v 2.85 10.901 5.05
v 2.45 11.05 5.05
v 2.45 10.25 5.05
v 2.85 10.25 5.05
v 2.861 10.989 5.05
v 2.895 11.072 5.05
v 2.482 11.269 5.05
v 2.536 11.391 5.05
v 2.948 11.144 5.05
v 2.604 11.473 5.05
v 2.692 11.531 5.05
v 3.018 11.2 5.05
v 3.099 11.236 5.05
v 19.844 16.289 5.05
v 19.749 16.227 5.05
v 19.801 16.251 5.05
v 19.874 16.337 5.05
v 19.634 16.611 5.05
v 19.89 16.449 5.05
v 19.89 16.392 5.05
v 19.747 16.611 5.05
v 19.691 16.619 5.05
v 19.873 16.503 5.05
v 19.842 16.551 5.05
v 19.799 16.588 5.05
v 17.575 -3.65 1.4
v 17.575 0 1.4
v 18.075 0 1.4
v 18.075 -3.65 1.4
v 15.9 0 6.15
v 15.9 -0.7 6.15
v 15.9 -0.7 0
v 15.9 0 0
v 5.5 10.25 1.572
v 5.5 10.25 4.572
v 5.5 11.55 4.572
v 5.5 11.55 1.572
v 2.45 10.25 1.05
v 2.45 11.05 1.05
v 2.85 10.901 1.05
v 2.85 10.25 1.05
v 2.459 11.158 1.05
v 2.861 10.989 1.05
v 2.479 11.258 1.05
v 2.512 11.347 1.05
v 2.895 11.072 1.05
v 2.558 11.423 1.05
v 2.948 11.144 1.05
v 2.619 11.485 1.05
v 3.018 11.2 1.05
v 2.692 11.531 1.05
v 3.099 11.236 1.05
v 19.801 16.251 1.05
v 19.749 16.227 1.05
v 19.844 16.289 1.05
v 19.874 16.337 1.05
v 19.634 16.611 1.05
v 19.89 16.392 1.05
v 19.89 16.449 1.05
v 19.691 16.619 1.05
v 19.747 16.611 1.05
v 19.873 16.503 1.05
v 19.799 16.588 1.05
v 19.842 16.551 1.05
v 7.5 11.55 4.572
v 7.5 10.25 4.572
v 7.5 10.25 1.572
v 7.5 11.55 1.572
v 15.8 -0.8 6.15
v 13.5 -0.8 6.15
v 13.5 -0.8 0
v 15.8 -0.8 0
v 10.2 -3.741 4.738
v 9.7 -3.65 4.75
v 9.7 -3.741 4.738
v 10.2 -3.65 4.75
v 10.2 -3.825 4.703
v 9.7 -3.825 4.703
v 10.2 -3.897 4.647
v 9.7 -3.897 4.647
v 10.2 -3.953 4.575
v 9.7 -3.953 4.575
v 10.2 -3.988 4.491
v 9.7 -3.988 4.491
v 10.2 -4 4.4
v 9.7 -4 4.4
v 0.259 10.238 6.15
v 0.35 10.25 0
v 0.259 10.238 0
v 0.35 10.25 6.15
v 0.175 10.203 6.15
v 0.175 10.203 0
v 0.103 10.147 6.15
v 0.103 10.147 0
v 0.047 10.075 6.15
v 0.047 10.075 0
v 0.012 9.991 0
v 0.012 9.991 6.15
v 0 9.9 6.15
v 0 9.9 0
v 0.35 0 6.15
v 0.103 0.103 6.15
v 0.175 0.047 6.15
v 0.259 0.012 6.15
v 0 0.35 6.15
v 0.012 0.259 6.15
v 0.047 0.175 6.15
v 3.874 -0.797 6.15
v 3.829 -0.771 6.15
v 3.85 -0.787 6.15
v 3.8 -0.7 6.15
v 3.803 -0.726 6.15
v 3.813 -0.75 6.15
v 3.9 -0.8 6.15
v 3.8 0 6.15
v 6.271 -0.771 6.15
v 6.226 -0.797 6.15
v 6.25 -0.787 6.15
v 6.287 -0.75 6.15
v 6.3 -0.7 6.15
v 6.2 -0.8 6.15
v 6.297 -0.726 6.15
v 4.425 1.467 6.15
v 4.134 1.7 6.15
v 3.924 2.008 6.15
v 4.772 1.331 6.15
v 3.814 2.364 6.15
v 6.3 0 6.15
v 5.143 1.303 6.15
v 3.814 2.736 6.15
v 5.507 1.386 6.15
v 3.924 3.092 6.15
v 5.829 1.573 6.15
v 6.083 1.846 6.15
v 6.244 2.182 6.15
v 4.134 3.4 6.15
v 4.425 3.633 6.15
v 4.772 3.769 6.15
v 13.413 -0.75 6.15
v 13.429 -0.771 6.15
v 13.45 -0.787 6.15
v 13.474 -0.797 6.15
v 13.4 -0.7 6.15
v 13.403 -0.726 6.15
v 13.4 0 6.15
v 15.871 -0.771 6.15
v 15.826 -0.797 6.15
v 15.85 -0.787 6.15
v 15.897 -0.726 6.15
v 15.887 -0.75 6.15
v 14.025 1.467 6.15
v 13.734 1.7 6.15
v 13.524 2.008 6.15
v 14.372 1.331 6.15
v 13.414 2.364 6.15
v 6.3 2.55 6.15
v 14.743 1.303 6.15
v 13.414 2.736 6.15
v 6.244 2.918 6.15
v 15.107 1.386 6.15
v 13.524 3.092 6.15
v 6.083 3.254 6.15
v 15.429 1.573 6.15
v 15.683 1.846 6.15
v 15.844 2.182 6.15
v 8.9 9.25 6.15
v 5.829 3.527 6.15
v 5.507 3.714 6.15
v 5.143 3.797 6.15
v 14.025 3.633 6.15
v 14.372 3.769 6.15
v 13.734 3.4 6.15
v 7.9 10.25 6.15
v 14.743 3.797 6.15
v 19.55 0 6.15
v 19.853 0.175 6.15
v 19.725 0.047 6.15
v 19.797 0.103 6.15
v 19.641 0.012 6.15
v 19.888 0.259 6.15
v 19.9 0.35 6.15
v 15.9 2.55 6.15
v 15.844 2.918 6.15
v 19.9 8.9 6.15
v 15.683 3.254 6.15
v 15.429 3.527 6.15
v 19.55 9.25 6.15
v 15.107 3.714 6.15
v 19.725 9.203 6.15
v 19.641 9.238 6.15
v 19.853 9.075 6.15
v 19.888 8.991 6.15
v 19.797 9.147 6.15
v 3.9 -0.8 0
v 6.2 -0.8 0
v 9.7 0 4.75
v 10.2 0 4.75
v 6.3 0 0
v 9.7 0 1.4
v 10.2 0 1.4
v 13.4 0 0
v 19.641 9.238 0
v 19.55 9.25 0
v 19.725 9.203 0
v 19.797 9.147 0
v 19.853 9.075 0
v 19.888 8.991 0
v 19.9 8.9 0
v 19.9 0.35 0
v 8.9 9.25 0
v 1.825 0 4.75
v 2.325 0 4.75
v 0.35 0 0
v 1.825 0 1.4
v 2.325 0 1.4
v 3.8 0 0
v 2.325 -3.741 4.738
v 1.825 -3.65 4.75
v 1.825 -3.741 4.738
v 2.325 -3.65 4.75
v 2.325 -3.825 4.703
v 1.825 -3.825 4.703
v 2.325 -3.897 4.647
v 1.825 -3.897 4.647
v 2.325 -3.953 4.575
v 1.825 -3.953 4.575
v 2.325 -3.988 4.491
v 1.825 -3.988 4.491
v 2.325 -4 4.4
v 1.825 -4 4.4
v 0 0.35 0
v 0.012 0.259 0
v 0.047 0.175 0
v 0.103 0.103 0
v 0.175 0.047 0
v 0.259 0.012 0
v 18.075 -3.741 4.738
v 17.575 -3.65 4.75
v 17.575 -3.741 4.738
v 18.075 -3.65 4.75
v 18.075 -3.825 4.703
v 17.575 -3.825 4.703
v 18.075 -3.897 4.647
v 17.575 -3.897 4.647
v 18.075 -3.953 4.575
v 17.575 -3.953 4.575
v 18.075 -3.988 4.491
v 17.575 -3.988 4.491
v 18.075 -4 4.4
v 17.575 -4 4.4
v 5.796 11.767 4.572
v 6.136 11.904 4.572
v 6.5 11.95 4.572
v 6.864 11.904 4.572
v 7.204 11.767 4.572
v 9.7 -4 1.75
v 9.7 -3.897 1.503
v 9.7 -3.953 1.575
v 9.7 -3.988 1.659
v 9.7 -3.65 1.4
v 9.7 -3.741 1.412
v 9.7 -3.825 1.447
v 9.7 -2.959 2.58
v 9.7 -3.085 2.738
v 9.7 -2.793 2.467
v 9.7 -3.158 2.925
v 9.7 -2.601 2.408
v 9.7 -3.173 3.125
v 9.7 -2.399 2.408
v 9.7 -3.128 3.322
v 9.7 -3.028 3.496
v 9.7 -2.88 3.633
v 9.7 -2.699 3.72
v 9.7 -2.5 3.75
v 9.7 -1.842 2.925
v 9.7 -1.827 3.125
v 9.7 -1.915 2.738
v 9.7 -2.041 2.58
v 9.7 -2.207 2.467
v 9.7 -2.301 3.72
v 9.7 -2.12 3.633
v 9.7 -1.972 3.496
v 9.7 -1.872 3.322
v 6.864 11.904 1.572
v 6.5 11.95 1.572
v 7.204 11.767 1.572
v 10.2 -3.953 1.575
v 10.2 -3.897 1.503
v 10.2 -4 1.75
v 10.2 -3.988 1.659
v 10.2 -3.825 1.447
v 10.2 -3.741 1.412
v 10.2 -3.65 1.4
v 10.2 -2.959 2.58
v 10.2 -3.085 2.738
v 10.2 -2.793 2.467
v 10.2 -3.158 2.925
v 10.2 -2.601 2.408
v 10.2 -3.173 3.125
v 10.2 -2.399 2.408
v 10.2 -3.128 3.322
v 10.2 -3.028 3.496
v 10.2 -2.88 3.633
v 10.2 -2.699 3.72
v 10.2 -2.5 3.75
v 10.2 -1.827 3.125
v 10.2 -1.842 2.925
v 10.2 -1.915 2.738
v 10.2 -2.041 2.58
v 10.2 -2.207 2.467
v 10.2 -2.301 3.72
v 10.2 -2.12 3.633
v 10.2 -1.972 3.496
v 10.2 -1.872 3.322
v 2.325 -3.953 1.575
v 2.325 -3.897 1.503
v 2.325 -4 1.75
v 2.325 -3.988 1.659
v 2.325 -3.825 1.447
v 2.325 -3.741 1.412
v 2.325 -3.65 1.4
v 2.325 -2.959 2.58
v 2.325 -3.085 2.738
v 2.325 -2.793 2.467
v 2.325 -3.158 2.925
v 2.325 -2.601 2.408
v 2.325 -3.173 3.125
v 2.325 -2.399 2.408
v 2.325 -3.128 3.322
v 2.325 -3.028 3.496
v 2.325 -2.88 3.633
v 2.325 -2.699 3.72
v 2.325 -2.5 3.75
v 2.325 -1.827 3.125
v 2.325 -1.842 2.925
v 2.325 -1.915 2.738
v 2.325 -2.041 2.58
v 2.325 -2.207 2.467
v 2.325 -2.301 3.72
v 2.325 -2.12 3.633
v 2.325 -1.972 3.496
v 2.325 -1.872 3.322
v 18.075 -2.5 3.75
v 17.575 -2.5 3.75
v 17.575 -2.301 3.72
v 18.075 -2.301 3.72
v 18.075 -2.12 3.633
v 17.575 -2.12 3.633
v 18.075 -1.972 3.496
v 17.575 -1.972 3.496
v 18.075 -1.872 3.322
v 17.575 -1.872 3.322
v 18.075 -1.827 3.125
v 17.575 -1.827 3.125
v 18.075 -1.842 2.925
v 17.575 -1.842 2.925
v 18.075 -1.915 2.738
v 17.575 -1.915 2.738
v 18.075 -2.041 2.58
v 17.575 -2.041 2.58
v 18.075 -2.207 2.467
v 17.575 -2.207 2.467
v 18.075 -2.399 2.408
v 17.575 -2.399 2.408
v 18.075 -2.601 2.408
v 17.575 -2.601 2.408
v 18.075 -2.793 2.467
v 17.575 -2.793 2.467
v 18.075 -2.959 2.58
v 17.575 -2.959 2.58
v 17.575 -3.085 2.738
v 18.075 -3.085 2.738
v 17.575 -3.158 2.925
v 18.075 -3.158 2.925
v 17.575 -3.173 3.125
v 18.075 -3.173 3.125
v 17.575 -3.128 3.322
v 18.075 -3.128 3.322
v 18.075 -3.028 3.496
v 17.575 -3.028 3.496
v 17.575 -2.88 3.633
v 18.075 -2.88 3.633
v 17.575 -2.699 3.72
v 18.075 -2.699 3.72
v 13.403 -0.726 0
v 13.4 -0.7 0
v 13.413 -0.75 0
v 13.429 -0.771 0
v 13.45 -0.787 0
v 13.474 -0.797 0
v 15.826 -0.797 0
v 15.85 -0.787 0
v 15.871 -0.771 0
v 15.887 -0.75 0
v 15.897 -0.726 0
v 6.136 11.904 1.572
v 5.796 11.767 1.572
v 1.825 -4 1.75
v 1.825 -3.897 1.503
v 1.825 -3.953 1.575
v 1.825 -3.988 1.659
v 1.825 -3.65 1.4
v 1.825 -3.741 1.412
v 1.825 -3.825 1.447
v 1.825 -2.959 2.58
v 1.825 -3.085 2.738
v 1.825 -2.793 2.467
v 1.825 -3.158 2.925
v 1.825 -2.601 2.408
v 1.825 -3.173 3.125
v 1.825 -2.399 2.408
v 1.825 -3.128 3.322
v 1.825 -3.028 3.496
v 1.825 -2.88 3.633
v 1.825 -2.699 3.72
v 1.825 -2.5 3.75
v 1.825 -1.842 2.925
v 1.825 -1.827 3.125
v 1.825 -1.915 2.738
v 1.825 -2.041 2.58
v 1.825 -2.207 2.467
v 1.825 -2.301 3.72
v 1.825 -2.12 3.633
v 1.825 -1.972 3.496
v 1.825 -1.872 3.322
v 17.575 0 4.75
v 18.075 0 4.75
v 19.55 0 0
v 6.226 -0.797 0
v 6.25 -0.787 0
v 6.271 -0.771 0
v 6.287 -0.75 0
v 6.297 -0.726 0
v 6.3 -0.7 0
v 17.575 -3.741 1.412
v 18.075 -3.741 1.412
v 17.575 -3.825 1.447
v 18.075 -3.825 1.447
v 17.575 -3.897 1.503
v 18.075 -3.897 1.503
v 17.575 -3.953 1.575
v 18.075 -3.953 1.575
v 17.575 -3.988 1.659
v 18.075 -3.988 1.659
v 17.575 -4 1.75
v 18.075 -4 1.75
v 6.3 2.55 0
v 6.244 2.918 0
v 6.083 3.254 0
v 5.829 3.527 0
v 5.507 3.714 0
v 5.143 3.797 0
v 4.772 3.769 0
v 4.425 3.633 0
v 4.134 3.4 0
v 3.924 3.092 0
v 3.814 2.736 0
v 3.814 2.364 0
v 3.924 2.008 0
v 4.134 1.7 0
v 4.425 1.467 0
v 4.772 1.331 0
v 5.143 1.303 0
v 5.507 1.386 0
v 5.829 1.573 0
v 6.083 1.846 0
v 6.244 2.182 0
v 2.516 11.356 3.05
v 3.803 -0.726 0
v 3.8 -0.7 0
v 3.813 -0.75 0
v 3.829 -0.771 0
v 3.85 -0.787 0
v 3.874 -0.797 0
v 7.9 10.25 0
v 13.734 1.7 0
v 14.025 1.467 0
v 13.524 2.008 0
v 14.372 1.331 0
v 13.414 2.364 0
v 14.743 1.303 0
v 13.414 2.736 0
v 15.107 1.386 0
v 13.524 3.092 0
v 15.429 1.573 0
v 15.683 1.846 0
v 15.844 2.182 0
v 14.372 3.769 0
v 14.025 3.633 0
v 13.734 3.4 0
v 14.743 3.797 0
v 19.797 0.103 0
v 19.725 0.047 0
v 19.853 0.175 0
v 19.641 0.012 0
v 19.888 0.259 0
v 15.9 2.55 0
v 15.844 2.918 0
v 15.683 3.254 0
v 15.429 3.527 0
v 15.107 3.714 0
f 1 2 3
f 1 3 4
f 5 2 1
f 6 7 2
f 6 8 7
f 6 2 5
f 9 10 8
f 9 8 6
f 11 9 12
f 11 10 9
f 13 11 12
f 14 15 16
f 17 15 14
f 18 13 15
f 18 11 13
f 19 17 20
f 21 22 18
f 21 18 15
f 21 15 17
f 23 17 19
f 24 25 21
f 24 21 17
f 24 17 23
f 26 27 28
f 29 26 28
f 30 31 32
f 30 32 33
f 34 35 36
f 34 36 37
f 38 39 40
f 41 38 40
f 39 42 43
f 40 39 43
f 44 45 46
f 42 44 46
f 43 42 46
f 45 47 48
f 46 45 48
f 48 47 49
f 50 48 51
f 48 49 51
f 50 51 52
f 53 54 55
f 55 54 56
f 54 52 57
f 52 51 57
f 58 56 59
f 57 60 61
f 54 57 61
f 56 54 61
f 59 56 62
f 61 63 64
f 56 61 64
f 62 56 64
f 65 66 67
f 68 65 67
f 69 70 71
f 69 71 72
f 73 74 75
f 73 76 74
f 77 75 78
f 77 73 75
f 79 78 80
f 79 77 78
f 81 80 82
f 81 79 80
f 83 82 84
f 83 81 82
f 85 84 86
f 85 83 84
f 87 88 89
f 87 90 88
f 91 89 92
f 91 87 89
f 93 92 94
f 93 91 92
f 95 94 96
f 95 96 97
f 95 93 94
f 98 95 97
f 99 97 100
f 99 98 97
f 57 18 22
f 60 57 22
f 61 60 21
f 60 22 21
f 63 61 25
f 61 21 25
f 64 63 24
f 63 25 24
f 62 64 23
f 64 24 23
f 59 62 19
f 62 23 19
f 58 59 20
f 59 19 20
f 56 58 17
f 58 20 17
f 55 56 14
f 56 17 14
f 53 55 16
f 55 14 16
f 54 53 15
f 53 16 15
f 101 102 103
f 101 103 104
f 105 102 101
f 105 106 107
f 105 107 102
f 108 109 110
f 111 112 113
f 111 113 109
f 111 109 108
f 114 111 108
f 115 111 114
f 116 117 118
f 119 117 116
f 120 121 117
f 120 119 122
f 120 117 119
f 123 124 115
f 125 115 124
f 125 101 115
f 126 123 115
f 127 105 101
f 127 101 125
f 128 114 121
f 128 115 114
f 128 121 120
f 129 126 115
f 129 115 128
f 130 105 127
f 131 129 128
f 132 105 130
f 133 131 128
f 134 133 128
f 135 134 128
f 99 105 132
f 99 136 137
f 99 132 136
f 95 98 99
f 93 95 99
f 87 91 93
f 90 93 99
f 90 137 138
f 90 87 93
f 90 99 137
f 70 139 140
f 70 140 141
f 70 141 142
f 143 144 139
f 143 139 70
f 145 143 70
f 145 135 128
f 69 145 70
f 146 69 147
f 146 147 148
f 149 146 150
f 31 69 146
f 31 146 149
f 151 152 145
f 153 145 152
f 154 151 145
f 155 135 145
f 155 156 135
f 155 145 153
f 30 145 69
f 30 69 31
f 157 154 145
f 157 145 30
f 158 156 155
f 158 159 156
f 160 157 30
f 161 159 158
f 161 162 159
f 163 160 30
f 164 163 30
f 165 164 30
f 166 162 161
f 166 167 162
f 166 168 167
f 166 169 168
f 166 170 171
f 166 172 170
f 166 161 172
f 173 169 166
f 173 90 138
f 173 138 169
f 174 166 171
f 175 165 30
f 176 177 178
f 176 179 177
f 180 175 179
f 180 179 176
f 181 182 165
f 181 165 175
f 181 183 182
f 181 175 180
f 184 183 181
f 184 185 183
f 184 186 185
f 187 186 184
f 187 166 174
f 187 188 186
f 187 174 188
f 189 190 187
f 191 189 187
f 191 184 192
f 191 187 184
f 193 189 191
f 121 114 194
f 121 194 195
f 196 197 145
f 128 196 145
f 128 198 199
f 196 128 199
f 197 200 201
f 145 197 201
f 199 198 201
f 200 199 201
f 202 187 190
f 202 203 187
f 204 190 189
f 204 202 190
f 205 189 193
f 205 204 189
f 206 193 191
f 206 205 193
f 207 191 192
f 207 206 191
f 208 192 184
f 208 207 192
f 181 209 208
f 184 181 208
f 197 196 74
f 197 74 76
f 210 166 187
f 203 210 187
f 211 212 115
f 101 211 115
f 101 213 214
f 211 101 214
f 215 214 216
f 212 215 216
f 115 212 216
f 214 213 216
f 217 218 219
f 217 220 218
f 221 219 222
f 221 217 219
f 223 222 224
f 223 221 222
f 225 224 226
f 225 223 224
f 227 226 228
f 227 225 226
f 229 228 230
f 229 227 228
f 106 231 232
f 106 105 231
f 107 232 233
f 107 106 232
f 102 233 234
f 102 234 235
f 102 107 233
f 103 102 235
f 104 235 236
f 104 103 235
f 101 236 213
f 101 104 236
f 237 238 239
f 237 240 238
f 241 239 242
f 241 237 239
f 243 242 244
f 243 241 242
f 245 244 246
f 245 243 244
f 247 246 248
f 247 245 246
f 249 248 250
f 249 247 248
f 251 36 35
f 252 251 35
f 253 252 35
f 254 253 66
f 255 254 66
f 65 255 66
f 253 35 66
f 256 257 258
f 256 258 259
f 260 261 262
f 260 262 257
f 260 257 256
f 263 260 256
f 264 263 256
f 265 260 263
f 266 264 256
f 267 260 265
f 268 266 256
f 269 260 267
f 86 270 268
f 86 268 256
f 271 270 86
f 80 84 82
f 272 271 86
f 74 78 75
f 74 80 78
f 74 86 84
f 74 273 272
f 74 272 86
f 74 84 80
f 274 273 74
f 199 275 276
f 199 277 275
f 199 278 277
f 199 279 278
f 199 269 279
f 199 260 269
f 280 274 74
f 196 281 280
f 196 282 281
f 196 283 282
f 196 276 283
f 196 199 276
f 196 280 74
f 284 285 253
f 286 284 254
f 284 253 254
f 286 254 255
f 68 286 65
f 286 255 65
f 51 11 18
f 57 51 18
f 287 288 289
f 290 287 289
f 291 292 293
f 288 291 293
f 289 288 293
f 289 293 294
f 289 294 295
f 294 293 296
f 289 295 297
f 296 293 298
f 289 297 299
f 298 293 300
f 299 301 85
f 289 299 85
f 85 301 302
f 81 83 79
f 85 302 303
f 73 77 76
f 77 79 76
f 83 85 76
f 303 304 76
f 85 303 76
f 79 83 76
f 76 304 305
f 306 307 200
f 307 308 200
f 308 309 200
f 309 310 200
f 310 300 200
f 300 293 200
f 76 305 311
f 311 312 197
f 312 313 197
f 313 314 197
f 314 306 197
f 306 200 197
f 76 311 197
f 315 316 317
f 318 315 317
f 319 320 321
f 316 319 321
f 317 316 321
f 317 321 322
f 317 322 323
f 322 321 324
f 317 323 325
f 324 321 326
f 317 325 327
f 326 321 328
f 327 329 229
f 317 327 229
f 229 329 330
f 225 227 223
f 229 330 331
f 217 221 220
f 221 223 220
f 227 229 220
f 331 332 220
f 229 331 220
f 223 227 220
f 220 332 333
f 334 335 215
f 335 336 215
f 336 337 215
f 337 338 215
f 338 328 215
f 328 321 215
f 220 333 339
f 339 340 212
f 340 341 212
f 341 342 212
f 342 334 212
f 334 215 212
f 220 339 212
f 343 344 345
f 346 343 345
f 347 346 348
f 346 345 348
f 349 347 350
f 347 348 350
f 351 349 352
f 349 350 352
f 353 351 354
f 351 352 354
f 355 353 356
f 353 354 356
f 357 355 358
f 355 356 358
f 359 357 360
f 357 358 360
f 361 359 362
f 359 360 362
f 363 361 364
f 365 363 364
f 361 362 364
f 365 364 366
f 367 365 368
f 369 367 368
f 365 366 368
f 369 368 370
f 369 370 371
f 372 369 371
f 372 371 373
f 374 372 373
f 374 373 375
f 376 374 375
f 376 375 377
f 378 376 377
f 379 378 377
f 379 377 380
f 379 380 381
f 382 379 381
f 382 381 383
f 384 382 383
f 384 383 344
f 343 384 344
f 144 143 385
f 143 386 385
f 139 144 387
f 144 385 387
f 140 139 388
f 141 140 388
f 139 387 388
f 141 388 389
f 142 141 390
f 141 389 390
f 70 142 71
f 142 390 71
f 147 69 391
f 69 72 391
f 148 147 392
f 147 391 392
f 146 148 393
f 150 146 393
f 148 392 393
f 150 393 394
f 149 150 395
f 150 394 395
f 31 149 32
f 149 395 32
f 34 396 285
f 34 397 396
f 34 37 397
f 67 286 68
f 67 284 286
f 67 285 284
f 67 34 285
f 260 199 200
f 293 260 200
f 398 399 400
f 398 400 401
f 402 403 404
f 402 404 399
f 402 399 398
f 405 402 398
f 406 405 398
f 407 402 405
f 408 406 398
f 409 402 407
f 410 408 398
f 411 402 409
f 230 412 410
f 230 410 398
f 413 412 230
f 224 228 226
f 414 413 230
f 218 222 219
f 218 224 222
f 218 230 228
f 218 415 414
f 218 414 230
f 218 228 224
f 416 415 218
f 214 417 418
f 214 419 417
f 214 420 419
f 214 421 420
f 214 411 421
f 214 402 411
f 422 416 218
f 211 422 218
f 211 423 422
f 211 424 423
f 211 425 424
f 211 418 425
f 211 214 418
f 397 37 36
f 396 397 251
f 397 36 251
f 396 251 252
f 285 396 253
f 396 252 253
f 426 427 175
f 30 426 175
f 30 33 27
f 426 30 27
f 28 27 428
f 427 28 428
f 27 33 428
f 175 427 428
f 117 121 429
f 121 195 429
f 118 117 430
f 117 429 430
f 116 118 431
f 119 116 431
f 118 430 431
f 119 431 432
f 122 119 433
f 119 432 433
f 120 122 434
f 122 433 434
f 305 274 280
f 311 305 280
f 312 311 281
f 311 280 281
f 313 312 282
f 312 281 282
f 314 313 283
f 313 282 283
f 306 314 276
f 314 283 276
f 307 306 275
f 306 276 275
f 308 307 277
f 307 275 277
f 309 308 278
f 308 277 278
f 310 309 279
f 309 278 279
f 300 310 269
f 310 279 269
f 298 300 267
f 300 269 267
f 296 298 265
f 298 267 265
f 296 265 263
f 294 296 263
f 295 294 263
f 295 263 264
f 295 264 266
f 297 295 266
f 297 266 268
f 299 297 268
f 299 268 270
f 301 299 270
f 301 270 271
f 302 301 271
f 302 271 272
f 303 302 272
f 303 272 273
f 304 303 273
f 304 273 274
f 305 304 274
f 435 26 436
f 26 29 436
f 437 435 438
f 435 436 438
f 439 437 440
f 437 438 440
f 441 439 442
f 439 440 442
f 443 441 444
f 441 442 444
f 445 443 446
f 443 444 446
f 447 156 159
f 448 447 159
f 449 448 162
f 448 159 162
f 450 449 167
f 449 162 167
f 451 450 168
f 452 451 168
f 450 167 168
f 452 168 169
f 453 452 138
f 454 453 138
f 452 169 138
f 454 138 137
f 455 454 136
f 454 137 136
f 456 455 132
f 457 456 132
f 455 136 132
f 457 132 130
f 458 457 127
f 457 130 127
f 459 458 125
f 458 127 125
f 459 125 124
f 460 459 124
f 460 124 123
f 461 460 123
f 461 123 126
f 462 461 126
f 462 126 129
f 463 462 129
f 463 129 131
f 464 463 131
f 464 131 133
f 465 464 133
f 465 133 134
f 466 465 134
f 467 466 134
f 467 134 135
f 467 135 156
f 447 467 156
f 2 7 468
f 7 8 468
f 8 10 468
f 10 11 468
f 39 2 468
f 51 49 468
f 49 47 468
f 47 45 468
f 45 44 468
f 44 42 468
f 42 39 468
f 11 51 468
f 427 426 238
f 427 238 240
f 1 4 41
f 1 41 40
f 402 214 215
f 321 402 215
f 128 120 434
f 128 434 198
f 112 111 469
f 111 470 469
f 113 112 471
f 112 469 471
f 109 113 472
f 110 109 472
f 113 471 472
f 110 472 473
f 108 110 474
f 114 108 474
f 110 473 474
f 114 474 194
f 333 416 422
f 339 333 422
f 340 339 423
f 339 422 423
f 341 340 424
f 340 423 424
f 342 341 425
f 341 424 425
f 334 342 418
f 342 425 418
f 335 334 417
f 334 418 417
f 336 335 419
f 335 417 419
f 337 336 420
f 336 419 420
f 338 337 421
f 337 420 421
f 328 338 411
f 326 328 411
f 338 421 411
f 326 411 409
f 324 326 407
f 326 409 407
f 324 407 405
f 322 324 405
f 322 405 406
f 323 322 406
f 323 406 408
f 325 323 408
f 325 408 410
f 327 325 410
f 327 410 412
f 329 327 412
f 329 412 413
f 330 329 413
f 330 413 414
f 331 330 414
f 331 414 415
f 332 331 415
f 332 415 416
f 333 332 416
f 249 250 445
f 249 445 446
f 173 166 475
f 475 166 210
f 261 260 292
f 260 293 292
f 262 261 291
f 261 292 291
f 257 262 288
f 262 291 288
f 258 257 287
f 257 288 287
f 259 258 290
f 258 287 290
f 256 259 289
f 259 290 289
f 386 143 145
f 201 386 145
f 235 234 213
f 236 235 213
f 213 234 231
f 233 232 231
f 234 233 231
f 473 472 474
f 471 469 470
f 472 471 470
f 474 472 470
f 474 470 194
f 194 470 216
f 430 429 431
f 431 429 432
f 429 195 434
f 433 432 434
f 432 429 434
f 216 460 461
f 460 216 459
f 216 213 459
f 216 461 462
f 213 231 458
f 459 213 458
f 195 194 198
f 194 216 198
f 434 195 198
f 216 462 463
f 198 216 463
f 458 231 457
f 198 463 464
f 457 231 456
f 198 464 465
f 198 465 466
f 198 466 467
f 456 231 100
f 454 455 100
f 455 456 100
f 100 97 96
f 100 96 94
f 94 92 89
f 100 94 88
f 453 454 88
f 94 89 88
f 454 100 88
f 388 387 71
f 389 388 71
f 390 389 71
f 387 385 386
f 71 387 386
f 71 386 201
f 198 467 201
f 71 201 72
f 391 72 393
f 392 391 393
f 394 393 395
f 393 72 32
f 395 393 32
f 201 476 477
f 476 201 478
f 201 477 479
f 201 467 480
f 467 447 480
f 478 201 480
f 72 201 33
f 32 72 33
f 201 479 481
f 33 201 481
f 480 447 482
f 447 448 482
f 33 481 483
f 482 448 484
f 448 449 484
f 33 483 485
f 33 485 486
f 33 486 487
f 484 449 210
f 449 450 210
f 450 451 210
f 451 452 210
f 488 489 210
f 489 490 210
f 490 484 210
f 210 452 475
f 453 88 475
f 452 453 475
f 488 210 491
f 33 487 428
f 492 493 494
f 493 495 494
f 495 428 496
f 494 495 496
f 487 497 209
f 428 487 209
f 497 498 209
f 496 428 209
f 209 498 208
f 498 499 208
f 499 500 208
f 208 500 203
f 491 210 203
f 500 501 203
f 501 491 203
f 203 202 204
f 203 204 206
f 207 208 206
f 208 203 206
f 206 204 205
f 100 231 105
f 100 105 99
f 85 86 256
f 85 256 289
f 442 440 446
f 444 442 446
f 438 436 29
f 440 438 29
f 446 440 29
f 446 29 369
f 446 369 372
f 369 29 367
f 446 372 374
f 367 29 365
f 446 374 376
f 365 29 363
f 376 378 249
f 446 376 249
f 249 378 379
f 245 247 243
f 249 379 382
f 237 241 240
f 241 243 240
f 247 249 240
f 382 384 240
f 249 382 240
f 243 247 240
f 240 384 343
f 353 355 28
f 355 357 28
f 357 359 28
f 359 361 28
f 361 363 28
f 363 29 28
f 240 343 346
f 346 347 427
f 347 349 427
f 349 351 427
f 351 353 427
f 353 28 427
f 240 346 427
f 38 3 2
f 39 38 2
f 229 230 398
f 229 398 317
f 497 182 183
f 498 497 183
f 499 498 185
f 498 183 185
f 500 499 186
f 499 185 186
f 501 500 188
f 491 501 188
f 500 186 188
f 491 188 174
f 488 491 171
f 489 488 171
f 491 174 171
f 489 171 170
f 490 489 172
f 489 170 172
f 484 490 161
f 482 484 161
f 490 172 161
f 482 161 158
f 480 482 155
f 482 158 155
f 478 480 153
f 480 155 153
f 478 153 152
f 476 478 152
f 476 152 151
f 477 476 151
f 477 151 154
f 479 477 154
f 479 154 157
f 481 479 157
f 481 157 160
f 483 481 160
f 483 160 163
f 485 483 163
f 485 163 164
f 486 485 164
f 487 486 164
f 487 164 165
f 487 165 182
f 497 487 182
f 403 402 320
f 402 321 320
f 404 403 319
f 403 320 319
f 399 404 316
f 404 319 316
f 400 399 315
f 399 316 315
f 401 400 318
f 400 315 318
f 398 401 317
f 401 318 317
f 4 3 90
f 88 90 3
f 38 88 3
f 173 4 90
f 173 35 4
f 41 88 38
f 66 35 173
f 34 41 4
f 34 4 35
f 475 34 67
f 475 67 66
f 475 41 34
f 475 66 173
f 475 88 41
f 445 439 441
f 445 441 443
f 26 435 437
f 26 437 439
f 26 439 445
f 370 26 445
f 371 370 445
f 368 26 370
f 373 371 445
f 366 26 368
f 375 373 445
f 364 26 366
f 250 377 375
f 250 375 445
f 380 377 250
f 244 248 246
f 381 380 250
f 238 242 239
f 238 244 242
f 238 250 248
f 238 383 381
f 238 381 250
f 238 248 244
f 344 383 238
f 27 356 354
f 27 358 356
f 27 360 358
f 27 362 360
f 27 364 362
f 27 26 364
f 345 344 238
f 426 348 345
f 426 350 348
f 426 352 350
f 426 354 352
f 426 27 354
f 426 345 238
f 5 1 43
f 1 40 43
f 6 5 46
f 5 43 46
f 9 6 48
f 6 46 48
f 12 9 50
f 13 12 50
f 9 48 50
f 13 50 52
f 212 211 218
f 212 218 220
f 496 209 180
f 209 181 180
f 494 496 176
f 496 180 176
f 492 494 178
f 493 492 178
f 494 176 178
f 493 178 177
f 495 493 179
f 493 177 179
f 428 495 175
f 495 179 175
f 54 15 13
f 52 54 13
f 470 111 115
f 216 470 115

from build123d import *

# Parameters (mm, degrees)
SKETCH1_W           = 19.9
SKETCH1_H           = 10.25
BOSS_EXTRUDE1_DEPTH = 6.15
SKETCH2_W           = 12
SKETCH2_H           = 1
CUT_EXTRUDE1_DEPTH  = 6.15
FILLET1_SIZE        = 1
FILLET2_R           = 0.35
SKETCH3_W           = 2
SKETCH3_H           = 3
BOSS_EXTRUDE2_DEPTH = 1.7
CUT_EXTRUDE2_DEPTH  = 21.5
SKETCH5_R           = 1.25
CUT_EXTRUDE3_DEPTH  = 21.5
SKETCH6_W           = 2.5
SKETCH6_H           = 0.8
BOSS_EXTRUDE3_DEPTH = 6.15
FILLET3_R           = 0.1
SKETCH7_W           = 0.5
SKETCH7_H           = 3.35
BOSS_EXTRUDE4_DEPTH = 4
SKETCH8_R           = 0.675
CUT_EXTRUDE4_DEPTH  = 44
FILLET4_R           = 0.35
BOSS_EXTRUDE5_START = -1.1
SKETCH9_W           = 0.4
SKETCH9_H           = 1
BOSS_EXTRUDE5_DEPTH = 4
CUT_EXTRUDE7_DEPTH  = 24
FILLET6_R           = 0.35


with BuildPart() as part:
    # Sketch1 → Boss-Extrude1 (new body)
    with BuildSketch(Plane.XY):
        with Locations((9.95, 5.125)):
            Rectangle(SKETCH1_W, SKETCH1_H)
    extrude(amount=BOSS_EXTRUDE1_DEPTH)

    # Sketch2 → Cut-Extrude1 (cut)
    with BuildSketch(Plane.XY.offset(6.15)):
        with Locations((13.9, 9.75)):
            Rectangle(SKETCH2_W, SKETCH2_H)
    extrude(amount=-CUT_EXTRUDE1_DEPTH, mode=Mode.SUBTRACT)

    # Fillet1
    fillet1_edges = [part.edges().sort_by_distance(p)[0] for p in [
        (7.9, 9.25, 3.075),
    ]]
    chamfer(fillet1_edges, length=FILLET1_SIZE - 0.0001)  # a hair under: the kernel refuses the full size

    # Fillet2
    fillet2_edges = [part.edges().sort_by_distance(p)[0] for p in [
        (19.9, 9.25, 3.075),
        (0, 10.25, 3.075),
        (19.9, 0, 3.075),
        (0, 0, 3.075),
    ]]
    fillet(fillet2_edges, radius=FILLET2_R)

    # Sketch3 → Boss-Extrude2 (add)
    with BuildSketch(Plane(origin=(0, 10.25, 0), x_dir=(1, 0, 0), z_dir=(0, 1, 0))):
        with Locations((6.5, -3.072396368)):
            Rectangle(SKETCH3_W, SKETCH3_H)
    extrude(amount=BOSS_EXTRUDE2_DEPTH)

    # Sketch4 → Cut-Extrude2 (cut)
    with BuildSketch(Plane.XY.offset(4.572396368)):
        with BuildLine():
            Line((5.5, 11.95), (5.5, 11.55))
            ThreePointArc((5.5, 11.55), (5.961483519, 11.846291202), (6.5, 11.95))
            Line((6.5, 11.95), (5.5, 11.95))
        make_face()
        with BuildLine():
            Line((7.5, 11.95), (6.5, 11.95))
            ThreePointArc((6.5, 11.95), (7.038516481, 11.846291202), (7.5, 11.55))
            Line((7.5, 11.55), (7.5, 11.95))
        make_face()
    extrude(amount=-CUT_EXTRUDE2_DEPTH, mode=Mode.SUBTRACT)

    # Sketch5 → Cut-Extrude3 (cut)
    with BuildSketch(Plane.XY.offset(6.15)):
        with Locations((5.05, 2.55)):
            Circle(SKETCH5_R)
        with Locations((14.65, 2.55)):
            Circle(SKETCH5_R)
    extrude(amount=-CUT_EXTRUDE3_DEPTH, mode=Mode.SUBTRACT)

    # Sketch6 → Boss-Extrude3 (add)
    with BuildSketch(Plane.XY.offset(6.15)):
        with Locations((5.05, -0.4)):
            Rectangle(SKETCH6_W, SKETCH6_H)
        with Locations((14.65, -0.4)):
            Rectangle(SKETCH6_W, SKETCH6_H)
    extrude(amount=-BOSS_EXTRUDE3_DEPTH)

    # Fillet3
    fillet3_edges = [part.edges().sort_by_distance(p)[0] for p in [
        (15.9, -0.8, 3.075),
        (13.4, -0.8, 3.075),
        (6.3, -0.8, 3.075),
        (3.8, -0.8, 3.075),
    ]]
    fillet(fillet3_edges, radius=FILLET3_R)

    # Sketch7 → Boss-Extrude4 (add)
    with BuildSketch(Plane.XZ):
        with Locations((2.075, 3.075)):
            Rectangle(SKETCH7_W, SKETCH7_H)
        with Locations((17.825, 3.075)):
            Rectangle(SKETCH7_W, SKETCH7_H)
        with Locations((9.95, 3.075)):
            Rectangle(SKETCH7_W, SKETCH7_H)
    extrude(amount=BOSS_EXTRUDE4_DEPTH)

    # Sketch8 → Cut-Extrude4 (cut)
    with BuildSketch(Plane.ZY.offset(-1.825)):
        with Locations((3.075, -2.5)):
            Circle(SKETCH8_R)
    extrude(amount=-CUT_EXTRUDE4_DEPTH, mode=Mode.SUBTRACT)

    # Fillet4
    fillet4_edges = [part.edges().sort_by_distance(p)[0] for p in [
        (2.075, -4, 1.4),
        (2.075, -4, 4.75),
        (17.825, -4, 4.75),
        (17.825, -4, 1.4),
        (9.95, -4, 4.75),
        (9.95, -4, 1.4),
    ]]
    fillet(fillet4_edges, radius=FILLET4_R)

    # Sketch9 → Boss-Extrude5 (add)
    with BuildSketch(Plane.XY.offset(6.15).offset(BOSS_EXTRUDE5_START)):
        with Locations((2.65, 10.75)):
            Rectangle(SKETCH9_W, SKETCH9_H)
        with BuildLine():
            Line((2.392566175, 11.441575979), (19.634404289, 16.61062023))
            ThreePointArc((19.634404289, 16.61062023), (19.883414093, 16.476478076), (19.749271939, 16.227468271))
            Line((19.749271939, 16.227468271), (2.507433825, 11.058424021))
            ThreePointArc((2.507433825, 11.058424021), (2.258424021, 11.192566175), (2.392566175, 11.441575979))
        make_face()
    extrude(amount=-BOSS_EXTRUDE5_DEPTH)

    # Sketch12 → Cut-Extrude7 (cut)
    with BuildSketch(Plane.XY.offset(5.05)):
        with BuildLine():
            Line((2.392566175, 11.441575979), (2.692202246, 11.531405851))
            add(Edge.make_bspline(
                [(2.45, 11.05), (2.461499925, 11.421364666), (2.692202246, 11.531405851)],
                knots=[0, 0, 0, 0.800009839, 0.800009839, 0.800009839], degree=2))
            ThreePointArc((2.45, 11.05), (2.252117212, 11.220975836), (2.392566175, 11.441575979))
        make_face()
    extrude(amount=-CUT_EXTRUDE7_DEPTH, mode=Mode.SUBTRACT)

    # Fillet6
    fillet6_edges = [part.edges().sort_by_distance(p)[0] for p in [
        (2.85, 11.161124192, 3.05),
    ]]
    fillet(fillet6_edges, radius=FILLET6_R)


solid = part.part
